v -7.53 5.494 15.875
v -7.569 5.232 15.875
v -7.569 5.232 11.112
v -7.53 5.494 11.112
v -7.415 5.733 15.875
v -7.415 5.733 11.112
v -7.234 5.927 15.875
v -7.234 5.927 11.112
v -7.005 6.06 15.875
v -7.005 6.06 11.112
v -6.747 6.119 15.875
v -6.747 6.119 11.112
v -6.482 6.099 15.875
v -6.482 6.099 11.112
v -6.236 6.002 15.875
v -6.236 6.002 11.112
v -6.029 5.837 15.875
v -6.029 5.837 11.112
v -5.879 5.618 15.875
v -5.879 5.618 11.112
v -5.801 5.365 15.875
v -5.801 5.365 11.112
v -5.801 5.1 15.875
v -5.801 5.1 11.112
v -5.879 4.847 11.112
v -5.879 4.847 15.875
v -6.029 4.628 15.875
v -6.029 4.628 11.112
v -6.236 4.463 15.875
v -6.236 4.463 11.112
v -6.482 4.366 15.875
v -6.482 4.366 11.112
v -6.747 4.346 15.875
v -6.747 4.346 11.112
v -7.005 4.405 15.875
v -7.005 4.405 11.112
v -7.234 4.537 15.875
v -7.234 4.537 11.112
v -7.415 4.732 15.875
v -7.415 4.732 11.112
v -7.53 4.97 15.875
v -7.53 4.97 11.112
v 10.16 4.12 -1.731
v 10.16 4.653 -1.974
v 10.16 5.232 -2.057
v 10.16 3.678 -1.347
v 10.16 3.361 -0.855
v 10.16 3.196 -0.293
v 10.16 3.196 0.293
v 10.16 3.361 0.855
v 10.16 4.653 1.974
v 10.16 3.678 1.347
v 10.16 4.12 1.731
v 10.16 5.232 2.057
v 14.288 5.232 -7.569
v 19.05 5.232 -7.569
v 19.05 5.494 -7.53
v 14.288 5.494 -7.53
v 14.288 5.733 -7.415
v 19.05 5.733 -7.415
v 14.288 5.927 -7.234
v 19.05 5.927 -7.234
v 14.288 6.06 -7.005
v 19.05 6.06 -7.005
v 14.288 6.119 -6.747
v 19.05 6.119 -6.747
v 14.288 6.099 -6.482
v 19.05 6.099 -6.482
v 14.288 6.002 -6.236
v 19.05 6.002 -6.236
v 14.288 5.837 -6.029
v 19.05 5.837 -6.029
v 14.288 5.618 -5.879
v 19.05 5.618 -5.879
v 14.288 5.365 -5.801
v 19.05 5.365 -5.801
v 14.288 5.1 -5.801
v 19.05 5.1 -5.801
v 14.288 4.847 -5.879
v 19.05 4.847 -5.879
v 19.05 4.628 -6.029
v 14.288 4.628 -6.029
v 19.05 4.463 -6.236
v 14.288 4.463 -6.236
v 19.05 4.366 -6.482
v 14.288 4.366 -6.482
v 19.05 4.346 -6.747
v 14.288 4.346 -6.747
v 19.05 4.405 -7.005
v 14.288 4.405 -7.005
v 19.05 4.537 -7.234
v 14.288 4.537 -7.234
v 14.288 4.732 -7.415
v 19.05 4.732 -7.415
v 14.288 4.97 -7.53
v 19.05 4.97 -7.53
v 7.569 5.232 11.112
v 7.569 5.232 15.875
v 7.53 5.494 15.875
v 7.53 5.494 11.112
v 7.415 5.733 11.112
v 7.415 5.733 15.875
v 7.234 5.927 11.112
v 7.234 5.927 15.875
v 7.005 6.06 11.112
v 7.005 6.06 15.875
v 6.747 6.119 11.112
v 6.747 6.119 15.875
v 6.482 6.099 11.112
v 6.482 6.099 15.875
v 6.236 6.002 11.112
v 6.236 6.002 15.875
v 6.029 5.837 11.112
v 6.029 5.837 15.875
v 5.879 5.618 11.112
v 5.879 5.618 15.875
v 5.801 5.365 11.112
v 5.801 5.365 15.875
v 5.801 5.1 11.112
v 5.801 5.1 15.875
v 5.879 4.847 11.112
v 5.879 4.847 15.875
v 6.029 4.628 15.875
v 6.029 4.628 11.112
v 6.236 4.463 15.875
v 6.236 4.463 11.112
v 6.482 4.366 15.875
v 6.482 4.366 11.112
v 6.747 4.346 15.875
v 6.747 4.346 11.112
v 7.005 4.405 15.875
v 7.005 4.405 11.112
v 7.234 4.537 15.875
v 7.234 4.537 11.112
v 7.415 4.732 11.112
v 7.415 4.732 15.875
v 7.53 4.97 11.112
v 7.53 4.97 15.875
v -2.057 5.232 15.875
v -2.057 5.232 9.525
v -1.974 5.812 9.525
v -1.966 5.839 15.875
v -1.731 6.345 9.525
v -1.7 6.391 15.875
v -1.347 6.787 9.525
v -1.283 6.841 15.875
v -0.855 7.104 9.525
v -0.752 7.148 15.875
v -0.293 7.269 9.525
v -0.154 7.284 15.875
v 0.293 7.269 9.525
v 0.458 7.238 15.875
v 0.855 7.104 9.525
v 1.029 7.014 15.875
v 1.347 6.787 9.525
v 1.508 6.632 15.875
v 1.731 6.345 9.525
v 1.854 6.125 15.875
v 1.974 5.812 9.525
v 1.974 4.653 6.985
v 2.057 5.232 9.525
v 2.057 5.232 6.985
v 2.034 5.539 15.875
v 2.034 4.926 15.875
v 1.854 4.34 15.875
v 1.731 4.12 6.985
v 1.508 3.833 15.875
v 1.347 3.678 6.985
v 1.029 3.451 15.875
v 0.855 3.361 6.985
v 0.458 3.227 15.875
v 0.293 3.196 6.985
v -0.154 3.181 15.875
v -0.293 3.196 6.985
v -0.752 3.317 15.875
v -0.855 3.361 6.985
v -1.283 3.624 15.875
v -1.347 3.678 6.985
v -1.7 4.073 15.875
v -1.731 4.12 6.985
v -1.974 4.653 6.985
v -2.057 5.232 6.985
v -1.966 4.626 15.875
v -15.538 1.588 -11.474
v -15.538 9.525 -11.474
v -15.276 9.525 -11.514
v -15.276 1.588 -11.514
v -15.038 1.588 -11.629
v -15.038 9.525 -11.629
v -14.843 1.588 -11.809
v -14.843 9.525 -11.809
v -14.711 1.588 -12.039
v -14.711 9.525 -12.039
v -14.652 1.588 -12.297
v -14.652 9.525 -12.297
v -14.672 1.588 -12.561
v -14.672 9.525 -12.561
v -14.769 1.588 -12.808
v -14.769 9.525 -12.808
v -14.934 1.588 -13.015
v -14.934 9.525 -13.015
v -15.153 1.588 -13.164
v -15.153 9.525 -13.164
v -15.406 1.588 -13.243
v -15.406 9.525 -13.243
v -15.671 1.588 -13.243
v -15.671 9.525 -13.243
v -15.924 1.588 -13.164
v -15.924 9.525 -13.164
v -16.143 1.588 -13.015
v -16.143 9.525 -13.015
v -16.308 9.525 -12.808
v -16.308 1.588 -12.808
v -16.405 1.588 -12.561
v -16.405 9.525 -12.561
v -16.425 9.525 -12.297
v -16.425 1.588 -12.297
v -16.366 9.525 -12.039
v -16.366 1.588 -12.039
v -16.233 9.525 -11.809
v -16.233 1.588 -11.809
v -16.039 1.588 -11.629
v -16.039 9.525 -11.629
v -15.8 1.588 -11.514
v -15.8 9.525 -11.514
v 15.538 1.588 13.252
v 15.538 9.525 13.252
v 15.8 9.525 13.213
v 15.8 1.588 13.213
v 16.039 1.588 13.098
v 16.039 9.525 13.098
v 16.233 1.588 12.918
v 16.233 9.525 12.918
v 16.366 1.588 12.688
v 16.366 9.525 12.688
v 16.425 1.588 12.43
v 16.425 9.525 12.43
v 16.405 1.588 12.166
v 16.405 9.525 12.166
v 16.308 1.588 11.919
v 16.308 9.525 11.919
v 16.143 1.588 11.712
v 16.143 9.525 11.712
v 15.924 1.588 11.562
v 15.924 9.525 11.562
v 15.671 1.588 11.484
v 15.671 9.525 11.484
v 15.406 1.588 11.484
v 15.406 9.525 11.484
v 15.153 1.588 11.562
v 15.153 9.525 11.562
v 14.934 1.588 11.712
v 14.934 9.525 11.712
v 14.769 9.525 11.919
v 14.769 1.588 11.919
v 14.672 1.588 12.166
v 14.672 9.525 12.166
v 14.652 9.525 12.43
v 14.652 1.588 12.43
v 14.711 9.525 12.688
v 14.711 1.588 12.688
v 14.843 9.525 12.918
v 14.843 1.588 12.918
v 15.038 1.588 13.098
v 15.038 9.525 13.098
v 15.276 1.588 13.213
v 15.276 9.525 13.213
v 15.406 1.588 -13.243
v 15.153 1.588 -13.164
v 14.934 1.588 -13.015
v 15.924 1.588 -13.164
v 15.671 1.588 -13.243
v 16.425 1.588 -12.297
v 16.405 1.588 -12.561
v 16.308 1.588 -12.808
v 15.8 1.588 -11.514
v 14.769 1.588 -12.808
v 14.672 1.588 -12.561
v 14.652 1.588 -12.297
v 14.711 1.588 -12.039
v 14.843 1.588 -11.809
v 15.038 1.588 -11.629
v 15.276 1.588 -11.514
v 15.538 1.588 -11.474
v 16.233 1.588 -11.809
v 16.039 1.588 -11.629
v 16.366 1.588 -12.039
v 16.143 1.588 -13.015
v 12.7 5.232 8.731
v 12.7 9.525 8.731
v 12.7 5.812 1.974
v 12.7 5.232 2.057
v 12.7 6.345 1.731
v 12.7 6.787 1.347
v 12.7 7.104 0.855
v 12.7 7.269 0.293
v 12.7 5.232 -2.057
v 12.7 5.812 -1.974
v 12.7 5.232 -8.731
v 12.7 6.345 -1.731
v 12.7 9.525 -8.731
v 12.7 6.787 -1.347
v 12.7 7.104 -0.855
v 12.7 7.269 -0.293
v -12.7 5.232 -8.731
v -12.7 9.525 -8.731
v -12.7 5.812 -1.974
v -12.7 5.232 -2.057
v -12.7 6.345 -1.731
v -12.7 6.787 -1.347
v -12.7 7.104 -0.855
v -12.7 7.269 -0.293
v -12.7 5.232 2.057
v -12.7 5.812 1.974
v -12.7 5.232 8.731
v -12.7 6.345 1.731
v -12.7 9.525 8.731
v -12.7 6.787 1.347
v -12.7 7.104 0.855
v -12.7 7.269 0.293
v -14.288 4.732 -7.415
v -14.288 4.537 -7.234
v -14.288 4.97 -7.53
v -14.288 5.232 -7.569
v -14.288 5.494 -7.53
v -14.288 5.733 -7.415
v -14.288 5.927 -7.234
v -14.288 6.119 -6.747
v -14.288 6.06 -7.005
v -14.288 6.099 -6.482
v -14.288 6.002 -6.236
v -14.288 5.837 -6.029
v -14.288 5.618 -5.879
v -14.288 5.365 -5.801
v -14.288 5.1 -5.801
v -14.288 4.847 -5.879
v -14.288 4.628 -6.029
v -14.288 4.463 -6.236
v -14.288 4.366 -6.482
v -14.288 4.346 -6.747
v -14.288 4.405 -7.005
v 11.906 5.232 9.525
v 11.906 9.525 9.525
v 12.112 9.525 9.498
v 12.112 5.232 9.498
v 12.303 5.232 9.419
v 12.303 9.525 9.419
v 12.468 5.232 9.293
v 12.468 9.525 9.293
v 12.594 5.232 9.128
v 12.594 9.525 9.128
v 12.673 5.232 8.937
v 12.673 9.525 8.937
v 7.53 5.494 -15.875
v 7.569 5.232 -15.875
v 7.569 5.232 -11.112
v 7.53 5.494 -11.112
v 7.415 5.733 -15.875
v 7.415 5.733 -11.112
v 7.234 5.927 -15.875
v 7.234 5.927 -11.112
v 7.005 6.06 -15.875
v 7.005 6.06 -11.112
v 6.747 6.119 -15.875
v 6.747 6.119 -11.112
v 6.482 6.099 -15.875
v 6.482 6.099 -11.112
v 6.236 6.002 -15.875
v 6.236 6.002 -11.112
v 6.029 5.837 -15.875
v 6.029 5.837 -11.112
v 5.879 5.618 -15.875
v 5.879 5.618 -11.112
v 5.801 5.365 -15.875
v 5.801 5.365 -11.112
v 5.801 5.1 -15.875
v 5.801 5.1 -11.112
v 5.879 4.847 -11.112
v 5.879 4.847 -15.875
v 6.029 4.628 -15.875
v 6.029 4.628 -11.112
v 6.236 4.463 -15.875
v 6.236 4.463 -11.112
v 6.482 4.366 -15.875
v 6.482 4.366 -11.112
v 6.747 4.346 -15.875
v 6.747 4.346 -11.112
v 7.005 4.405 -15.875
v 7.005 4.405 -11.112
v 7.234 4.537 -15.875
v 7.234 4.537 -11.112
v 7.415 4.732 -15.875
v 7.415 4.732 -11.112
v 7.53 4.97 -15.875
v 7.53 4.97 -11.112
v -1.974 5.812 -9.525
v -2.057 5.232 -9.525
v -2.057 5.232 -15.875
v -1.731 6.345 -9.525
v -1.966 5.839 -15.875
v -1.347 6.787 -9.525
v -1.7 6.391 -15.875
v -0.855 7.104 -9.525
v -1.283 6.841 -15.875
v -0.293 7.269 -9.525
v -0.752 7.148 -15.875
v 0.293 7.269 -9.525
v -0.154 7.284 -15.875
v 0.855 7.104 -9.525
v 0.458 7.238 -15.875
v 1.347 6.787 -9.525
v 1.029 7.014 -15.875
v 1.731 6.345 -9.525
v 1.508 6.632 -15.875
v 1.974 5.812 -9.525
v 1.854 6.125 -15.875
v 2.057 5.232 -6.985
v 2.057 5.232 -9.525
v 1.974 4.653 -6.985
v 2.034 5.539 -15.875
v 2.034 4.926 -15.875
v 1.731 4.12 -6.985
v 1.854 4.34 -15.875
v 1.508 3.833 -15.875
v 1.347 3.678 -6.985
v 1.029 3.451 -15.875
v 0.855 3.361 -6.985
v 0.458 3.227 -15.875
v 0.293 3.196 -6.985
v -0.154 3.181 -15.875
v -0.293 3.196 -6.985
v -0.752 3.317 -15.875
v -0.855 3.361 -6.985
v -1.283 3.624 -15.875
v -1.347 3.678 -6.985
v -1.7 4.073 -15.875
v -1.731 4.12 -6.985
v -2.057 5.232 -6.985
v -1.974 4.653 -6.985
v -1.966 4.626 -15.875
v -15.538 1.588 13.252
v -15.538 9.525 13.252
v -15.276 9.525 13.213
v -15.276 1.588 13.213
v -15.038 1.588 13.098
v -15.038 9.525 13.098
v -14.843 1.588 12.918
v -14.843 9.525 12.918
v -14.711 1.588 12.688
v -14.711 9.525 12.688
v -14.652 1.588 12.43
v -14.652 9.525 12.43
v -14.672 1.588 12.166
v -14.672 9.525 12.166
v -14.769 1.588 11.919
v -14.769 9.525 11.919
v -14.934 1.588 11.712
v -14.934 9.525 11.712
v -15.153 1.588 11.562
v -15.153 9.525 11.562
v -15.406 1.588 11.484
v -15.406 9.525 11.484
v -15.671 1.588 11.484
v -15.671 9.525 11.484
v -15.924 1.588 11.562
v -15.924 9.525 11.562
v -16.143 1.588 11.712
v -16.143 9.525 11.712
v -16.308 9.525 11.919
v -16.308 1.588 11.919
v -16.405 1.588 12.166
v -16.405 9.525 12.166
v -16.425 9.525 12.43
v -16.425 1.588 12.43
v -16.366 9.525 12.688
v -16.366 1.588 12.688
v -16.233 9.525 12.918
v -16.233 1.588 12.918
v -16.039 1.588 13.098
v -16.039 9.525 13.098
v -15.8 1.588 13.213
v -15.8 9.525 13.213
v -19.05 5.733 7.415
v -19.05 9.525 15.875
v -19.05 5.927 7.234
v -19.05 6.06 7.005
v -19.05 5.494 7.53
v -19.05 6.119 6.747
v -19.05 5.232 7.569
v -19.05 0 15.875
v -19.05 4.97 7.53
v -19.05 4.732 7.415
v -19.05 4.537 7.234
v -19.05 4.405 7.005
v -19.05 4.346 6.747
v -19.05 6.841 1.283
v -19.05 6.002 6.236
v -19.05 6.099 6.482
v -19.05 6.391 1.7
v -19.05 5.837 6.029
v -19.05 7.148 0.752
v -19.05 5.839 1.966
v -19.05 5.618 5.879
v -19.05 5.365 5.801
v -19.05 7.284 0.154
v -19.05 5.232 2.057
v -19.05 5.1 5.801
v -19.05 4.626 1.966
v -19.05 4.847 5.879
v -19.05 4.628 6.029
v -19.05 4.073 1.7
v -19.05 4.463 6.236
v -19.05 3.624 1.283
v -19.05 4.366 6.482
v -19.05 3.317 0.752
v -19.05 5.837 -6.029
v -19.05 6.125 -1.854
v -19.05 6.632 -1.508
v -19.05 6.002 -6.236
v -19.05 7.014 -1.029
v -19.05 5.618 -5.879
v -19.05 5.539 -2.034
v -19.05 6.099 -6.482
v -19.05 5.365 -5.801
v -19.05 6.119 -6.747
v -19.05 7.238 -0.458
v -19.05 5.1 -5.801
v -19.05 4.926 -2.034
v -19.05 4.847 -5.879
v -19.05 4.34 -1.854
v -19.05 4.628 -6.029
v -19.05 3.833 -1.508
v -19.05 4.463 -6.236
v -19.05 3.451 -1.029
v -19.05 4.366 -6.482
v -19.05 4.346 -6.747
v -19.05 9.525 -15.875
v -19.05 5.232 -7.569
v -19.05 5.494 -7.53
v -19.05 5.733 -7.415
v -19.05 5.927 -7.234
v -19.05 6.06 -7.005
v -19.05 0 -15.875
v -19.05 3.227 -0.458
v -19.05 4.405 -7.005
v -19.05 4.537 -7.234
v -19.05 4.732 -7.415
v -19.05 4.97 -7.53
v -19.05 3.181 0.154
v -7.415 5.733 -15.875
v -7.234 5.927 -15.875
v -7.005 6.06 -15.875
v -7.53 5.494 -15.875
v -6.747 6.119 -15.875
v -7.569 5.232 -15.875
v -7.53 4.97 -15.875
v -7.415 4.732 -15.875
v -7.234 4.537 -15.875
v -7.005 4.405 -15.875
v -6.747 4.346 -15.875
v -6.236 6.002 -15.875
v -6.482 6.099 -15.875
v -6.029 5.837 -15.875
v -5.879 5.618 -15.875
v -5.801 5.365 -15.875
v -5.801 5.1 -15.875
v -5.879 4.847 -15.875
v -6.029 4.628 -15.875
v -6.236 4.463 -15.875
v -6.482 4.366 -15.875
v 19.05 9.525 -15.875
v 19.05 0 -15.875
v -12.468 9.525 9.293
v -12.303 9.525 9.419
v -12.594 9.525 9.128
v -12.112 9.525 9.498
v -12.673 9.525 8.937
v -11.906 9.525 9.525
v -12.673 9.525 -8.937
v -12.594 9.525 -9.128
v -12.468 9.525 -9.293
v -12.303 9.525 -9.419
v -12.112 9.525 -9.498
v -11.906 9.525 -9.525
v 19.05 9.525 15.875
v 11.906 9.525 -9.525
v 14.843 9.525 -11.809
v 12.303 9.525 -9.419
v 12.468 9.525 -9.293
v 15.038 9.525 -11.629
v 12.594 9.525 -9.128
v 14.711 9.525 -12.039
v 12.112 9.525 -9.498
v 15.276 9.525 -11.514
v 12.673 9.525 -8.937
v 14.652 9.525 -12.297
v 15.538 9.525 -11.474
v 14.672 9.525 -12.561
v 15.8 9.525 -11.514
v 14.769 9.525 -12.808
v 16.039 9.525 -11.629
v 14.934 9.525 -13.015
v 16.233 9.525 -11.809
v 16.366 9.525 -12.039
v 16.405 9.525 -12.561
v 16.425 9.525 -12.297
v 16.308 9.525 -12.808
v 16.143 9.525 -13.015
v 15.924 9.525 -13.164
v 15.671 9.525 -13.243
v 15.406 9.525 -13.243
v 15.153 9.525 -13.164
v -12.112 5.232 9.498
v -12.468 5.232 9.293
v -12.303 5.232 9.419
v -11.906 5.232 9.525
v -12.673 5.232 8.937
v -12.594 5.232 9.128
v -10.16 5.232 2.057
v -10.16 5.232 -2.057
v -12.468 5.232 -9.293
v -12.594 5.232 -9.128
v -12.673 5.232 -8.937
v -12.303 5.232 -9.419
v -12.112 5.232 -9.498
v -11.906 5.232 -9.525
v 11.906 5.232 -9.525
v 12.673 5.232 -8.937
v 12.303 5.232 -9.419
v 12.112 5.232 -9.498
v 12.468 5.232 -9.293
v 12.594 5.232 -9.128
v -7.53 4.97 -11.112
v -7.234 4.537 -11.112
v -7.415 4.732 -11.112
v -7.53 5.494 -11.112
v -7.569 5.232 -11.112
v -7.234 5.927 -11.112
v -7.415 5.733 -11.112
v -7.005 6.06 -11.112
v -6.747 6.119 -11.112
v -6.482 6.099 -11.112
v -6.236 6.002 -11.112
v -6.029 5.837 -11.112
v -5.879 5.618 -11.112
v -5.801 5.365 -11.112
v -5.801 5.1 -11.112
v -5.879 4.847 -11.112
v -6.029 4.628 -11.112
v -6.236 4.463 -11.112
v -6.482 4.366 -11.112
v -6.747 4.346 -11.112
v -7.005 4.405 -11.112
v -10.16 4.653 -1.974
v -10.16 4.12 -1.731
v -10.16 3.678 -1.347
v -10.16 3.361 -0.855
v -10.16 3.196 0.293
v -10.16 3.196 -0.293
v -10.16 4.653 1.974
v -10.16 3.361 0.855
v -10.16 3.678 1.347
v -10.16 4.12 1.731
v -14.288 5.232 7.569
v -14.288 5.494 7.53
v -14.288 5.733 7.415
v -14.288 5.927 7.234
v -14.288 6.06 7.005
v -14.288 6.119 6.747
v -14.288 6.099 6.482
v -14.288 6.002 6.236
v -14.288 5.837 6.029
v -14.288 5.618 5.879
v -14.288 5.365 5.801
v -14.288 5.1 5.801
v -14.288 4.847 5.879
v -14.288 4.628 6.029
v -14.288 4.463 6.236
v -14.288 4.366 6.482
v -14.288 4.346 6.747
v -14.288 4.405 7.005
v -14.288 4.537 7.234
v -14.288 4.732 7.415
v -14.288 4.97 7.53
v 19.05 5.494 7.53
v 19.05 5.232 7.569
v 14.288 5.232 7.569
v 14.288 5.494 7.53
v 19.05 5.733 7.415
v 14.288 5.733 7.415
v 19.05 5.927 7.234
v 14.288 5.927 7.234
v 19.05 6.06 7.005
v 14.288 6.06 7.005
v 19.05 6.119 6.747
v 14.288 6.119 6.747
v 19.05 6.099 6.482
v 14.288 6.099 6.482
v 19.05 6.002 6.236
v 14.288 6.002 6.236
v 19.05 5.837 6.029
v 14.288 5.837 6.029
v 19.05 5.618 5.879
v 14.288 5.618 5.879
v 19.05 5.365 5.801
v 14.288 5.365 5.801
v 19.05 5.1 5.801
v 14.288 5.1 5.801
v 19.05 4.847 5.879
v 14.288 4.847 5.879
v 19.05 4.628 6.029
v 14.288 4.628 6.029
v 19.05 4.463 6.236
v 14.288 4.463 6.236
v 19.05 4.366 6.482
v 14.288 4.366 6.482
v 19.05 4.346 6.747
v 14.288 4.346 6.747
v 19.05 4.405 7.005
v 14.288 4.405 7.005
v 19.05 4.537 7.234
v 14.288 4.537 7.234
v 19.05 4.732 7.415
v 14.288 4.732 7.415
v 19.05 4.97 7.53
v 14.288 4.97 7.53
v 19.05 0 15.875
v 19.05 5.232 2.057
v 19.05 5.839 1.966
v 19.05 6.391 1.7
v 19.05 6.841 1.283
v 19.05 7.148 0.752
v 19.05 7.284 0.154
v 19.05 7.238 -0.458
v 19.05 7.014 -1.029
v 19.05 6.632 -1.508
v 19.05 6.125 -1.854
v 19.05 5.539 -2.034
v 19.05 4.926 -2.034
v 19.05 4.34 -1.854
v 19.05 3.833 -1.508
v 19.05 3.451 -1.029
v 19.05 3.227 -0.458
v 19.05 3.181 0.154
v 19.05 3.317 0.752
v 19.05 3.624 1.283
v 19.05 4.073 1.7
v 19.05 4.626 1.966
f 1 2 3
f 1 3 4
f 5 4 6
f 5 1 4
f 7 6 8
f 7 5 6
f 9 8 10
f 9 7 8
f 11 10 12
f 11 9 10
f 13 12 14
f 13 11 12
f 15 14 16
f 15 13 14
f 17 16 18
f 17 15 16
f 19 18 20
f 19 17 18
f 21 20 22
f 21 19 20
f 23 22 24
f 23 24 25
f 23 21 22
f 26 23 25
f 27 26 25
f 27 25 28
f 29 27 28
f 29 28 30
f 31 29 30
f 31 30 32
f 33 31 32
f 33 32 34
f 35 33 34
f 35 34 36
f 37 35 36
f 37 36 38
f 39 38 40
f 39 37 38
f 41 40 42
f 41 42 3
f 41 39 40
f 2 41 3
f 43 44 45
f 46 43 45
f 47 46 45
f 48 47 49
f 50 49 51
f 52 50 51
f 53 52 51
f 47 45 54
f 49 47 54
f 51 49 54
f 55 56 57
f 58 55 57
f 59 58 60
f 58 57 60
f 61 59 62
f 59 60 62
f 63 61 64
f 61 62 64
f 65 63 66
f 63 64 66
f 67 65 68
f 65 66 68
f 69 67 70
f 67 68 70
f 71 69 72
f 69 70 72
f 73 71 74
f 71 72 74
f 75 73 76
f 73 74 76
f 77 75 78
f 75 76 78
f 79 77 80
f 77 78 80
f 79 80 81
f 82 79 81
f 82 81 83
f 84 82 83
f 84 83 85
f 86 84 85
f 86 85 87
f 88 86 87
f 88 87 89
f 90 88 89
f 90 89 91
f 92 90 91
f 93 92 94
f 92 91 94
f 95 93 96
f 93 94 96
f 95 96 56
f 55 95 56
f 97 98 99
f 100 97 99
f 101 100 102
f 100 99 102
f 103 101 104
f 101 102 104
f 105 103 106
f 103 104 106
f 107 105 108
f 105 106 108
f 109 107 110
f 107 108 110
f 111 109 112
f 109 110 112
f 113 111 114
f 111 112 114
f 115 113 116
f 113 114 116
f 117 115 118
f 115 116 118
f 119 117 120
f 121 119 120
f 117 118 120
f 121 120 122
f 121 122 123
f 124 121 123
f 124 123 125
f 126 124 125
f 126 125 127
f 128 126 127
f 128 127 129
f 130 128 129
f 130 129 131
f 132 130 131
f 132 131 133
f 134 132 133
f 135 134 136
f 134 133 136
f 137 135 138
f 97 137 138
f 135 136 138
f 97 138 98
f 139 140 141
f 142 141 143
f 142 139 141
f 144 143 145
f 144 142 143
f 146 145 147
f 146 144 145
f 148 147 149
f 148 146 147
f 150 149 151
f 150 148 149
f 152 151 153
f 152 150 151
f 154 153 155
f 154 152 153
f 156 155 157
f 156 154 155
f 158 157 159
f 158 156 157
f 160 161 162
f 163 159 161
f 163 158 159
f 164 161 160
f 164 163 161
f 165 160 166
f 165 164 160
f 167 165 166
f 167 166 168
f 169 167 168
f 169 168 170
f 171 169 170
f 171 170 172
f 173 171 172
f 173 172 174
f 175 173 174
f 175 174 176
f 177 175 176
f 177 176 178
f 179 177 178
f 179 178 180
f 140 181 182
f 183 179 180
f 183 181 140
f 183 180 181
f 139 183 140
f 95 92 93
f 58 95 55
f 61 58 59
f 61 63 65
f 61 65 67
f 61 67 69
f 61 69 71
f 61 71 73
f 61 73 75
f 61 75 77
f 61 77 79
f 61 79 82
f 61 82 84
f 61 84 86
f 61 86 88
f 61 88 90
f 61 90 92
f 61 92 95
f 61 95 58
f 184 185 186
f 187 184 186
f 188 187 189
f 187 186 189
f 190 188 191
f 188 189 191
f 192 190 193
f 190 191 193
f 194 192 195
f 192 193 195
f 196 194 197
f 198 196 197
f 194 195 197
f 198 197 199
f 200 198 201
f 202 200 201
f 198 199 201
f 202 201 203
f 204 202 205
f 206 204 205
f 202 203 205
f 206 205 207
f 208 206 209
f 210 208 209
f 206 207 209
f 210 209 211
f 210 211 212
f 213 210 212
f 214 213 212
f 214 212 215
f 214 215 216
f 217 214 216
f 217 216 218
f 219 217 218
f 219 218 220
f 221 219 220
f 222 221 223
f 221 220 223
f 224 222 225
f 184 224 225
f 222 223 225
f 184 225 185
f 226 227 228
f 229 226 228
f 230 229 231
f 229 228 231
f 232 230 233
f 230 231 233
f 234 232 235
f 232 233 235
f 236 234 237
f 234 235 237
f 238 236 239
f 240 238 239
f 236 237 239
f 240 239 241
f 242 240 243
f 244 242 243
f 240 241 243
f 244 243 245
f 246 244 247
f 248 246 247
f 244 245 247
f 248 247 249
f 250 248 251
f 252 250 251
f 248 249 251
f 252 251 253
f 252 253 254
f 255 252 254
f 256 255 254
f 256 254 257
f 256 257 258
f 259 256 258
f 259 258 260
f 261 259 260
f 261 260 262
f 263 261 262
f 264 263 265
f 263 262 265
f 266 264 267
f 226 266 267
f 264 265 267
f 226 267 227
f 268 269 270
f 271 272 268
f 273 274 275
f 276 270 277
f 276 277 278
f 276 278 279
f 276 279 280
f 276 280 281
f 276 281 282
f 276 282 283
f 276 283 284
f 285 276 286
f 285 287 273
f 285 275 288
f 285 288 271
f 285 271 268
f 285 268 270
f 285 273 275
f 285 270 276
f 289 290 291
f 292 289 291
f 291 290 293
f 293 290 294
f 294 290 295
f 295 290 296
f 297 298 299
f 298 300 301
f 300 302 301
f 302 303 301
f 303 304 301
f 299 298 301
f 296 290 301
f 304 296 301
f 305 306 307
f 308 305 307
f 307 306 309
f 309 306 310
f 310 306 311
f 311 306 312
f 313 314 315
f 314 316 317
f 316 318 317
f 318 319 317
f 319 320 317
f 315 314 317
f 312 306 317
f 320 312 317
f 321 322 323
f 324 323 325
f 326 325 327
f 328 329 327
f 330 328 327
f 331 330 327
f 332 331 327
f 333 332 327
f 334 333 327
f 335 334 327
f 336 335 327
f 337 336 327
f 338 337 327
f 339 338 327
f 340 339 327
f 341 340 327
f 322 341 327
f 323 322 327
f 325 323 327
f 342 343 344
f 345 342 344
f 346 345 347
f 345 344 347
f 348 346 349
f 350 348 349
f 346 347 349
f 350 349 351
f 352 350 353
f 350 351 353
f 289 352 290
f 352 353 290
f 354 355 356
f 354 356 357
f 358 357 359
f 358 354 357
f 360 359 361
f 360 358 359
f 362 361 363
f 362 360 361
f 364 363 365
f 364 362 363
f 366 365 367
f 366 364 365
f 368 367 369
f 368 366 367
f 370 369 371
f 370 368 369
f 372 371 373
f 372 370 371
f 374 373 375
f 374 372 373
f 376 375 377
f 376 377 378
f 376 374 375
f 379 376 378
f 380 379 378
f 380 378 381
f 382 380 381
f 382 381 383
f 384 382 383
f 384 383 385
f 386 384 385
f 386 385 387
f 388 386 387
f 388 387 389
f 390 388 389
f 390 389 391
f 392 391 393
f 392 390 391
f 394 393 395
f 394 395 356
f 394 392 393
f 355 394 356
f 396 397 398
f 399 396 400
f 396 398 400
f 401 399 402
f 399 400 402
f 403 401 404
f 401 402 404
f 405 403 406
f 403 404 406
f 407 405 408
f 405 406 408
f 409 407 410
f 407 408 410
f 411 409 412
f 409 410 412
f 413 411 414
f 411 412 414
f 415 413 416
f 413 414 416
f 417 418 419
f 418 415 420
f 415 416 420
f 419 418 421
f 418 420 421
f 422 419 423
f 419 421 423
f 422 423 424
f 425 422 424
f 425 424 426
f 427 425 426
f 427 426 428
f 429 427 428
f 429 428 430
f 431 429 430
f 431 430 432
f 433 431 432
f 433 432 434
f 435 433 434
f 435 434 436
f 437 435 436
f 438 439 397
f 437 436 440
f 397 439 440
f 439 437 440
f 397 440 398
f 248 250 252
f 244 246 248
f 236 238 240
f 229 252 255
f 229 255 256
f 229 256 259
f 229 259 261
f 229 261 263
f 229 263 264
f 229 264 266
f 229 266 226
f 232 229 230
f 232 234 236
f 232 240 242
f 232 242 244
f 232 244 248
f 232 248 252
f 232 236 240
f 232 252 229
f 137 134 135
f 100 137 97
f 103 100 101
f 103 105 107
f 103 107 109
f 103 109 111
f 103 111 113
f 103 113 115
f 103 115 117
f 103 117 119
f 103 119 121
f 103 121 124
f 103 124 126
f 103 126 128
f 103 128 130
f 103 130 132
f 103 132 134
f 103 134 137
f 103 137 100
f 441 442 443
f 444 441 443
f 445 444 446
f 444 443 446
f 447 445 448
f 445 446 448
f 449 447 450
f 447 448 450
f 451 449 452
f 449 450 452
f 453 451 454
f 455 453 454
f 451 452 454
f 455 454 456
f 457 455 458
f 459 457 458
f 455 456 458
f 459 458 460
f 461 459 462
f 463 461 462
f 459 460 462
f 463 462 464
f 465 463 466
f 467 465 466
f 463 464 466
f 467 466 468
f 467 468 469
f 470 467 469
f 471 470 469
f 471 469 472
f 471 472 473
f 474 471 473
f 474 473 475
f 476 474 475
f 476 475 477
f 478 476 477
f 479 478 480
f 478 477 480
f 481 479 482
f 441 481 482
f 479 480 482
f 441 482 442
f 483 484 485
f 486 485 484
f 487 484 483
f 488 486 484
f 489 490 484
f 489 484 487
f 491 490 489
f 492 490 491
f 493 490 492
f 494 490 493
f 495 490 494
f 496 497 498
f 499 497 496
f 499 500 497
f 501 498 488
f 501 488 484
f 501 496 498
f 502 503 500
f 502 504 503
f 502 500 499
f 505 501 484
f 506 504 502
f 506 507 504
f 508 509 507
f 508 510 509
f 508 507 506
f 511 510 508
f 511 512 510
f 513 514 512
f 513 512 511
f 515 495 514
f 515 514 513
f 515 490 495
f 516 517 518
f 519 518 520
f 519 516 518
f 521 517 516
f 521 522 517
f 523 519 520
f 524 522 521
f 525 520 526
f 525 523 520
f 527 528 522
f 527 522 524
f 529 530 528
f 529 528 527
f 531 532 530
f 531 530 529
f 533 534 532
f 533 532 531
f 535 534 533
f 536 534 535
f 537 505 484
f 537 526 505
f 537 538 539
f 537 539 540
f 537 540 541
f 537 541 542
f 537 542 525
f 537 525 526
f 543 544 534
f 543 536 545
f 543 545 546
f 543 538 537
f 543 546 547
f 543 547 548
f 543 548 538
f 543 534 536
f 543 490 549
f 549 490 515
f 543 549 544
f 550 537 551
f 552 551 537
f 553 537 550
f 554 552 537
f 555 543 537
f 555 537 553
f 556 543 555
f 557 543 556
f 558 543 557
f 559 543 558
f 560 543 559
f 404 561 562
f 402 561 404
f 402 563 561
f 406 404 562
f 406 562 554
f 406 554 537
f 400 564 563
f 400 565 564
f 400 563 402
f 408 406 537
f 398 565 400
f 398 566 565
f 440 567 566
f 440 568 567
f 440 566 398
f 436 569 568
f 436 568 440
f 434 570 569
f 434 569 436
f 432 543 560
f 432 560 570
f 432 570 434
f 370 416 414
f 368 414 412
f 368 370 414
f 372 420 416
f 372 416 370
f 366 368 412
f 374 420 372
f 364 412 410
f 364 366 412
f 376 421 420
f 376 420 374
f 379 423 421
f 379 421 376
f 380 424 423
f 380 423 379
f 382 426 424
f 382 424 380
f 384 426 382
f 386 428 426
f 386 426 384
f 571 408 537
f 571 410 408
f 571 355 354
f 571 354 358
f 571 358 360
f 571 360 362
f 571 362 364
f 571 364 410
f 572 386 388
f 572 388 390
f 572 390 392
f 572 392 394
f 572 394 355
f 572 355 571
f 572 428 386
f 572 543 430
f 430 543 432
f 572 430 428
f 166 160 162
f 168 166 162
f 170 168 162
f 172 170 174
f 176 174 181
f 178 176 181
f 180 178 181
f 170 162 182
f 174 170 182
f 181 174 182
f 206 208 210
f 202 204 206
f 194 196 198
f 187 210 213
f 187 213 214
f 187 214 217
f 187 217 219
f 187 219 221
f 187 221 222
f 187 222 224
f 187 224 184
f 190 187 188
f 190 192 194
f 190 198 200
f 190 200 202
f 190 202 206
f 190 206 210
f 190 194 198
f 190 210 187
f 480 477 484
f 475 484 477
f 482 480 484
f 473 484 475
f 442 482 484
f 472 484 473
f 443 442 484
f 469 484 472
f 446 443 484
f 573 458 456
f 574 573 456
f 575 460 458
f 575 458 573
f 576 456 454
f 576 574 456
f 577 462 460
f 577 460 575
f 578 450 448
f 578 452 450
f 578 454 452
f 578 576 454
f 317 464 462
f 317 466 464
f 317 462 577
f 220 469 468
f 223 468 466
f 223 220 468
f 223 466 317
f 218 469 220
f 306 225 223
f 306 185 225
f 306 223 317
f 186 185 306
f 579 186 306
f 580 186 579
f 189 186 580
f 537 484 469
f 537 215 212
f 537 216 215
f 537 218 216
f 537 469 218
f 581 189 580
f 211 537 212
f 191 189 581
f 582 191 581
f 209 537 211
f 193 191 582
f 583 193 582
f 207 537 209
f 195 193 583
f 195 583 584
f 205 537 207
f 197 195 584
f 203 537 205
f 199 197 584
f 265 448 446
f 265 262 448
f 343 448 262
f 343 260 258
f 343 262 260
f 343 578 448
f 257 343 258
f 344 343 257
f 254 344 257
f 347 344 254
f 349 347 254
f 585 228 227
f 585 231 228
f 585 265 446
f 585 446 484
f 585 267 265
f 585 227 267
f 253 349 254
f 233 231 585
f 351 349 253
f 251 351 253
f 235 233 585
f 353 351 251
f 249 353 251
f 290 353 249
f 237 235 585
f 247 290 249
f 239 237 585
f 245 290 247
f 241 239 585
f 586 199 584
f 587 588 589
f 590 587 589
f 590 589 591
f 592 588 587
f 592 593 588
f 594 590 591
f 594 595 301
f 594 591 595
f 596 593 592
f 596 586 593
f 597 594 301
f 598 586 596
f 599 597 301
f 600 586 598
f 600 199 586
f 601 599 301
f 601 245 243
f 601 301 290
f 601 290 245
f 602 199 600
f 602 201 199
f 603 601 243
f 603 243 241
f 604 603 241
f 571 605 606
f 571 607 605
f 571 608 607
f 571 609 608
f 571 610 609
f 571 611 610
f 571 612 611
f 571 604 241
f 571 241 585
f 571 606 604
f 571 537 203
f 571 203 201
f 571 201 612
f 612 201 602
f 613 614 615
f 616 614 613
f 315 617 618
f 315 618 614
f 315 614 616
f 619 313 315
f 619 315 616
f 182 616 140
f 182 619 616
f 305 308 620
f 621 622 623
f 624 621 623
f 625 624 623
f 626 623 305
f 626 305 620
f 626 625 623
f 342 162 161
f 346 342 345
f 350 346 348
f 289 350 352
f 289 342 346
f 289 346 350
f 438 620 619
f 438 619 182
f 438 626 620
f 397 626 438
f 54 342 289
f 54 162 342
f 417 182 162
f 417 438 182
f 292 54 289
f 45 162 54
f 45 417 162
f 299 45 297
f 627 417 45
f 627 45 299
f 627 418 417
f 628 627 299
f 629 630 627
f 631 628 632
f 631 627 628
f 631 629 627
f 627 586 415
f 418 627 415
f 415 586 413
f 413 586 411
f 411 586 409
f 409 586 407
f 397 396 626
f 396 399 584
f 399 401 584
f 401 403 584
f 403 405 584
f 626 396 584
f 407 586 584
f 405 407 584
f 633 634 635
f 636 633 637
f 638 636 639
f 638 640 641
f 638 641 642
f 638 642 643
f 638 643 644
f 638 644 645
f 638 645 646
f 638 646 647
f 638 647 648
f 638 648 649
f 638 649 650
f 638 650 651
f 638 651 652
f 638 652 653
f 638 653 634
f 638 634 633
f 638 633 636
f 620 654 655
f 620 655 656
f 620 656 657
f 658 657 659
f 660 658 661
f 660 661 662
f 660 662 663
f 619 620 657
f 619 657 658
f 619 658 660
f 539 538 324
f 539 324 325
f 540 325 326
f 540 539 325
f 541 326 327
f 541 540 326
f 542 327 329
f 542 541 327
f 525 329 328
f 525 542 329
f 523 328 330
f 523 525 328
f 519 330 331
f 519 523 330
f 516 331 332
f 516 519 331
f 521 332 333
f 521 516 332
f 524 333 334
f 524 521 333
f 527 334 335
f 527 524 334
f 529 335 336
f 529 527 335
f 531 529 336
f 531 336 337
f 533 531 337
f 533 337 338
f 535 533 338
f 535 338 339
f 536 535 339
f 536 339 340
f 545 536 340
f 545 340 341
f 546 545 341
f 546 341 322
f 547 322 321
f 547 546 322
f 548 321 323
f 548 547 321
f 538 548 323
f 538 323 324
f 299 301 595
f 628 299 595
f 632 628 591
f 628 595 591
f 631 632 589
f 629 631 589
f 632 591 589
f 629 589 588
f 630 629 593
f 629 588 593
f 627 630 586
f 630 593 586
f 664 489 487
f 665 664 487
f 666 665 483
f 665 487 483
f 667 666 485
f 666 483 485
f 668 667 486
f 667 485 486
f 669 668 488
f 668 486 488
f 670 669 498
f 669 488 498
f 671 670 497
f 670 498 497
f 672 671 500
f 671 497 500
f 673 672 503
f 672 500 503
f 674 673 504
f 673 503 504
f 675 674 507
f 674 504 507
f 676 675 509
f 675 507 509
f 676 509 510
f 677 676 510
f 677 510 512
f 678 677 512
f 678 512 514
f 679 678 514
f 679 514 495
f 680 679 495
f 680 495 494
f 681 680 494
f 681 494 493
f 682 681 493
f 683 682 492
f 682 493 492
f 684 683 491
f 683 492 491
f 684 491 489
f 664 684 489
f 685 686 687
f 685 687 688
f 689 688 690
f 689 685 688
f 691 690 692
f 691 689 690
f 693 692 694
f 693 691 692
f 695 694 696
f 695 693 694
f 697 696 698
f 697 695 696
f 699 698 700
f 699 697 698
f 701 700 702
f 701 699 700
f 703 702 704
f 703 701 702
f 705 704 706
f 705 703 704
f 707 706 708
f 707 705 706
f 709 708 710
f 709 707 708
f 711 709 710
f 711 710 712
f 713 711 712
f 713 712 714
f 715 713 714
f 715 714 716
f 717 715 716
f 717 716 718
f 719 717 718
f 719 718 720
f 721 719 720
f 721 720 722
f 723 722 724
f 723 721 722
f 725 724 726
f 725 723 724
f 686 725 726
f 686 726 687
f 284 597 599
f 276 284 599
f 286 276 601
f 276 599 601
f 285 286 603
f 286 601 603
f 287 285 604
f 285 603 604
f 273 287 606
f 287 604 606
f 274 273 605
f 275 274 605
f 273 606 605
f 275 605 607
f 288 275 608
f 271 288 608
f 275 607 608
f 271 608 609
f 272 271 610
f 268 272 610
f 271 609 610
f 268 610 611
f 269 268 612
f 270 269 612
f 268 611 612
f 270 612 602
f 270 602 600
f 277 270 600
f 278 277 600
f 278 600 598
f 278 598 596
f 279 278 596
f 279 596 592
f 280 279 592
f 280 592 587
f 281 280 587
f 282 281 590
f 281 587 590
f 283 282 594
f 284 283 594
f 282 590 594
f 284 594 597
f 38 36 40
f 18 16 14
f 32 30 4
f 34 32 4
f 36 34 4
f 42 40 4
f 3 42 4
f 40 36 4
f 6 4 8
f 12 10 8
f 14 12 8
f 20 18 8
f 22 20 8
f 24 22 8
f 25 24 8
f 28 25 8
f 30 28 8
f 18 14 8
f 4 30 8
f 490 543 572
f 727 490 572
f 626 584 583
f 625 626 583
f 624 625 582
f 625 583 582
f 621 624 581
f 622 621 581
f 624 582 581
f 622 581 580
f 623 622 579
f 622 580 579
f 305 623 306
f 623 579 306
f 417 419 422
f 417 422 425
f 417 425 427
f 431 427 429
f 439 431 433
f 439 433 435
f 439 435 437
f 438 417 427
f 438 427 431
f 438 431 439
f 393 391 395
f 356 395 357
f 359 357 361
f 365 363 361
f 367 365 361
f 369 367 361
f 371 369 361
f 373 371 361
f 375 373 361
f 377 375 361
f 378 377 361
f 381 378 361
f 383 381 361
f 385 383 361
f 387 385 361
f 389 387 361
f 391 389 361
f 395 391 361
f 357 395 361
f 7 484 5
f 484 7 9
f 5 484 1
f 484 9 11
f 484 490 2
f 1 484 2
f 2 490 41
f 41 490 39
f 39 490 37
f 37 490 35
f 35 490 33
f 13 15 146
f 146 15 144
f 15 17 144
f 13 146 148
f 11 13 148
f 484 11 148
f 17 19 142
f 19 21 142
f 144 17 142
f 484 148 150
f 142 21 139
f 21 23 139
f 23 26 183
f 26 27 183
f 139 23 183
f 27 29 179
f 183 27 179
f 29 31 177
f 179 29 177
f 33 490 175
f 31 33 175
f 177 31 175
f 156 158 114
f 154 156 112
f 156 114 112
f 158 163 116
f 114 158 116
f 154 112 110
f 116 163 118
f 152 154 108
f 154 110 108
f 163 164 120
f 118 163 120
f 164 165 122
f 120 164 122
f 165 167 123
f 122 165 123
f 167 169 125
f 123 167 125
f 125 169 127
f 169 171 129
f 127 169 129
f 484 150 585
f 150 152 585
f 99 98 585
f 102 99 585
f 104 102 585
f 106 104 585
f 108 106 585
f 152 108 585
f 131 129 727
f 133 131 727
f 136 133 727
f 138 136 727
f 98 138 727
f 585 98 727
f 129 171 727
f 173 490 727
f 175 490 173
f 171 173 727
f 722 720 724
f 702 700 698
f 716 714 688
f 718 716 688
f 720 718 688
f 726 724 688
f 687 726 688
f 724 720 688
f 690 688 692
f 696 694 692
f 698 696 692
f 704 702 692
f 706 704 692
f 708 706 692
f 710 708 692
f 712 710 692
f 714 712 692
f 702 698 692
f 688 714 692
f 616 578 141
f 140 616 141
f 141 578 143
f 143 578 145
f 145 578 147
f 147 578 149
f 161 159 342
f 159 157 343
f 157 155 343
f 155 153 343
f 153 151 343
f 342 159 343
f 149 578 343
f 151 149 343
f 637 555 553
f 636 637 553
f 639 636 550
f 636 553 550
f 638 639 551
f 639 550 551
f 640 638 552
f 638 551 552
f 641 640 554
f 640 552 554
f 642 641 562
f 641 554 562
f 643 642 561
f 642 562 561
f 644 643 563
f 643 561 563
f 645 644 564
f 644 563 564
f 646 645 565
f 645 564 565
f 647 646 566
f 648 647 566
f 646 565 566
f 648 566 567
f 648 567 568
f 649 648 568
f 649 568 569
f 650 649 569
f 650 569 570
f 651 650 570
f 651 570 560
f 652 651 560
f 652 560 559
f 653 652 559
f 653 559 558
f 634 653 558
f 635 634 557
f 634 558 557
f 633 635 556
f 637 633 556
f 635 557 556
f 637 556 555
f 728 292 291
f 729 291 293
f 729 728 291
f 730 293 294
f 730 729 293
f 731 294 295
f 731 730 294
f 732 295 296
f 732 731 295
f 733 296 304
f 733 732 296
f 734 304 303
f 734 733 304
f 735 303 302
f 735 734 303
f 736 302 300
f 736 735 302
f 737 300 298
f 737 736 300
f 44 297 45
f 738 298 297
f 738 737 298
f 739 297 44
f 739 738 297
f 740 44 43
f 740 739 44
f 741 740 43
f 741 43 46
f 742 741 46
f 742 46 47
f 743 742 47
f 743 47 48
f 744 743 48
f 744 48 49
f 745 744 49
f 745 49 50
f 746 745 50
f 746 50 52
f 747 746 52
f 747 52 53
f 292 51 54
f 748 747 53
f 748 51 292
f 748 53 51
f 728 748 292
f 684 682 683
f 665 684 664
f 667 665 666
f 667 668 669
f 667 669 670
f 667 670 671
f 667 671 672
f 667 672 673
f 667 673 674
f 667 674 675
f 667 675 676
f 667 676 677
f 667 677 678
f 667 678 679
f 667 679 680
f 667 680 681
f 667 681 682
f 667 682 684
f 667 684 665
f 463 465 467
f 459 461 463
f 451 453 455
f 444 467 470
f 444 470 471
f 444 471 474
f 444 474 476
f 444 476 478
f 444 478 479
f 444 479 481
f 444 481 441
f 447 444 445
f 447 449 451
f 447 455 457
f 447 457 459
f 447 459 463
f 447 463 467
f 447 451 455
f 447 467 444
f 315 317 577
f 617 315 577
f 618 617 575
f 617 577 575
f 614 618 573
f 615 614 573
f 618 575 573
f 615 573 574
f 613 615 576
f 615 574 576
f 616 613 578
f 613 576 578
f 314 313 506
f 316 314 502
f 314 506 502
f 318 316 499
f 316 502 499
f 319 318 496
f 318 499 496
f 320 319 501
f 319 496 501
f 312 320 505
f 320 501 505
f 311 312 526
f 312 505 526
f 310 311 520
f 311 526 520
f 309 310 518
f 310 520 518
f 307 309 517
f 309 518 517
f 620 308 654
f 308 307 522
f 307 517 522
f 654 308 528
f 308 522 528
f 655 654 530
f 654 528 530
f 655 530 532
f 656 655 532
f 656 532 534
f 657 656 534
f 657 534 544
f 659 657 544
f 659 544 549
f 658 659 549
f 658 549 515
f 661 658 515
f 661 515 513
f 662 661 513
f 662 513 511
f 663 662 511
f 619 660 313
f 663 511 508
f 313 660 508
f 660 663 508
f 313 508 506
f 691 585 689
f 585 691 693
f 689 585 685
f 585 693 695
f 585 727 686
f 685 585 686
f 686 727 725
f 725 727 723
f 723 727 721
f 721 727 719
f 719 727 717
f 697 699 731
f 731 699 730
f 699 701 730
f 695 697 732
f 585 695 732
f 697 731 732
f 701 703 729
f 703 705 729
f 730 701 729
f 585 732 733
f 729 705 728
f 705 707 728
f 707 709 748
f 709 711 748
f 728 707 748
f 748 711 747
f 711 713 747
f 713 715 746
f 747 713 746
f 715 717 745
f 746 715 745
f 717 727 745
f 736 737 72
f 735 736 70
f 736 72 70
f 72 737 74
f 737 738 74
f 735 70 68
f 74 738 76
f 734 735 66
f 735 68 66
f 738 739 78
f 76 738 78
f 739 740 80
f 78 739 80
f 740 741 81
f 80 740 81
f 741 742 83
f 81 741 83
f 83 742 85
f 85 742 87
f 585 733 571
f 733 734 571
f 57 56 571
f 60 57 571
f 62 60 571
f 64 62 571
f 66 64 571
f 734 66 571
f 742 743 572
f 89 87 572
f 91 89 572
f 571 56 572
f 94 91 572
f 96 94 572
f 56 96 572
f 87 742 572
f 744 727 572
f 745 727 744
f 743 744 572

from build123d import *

# Parameters (mm, degrees)
SKETCH1_W               = 38.1
SKETCH1_H               = 31.75
BOSS_EXTRUDE1_DEPTH     = 9.525
CUT_EXTRUDE2_DEPTH      = 4.2926
SKETCH3_R               = 2.0574
CUT_EXTRUDE3_DEPTH      = 8.89
SKETCH7_R               = 2.0574
CUT_EXTRUDE5_DEPTH      = 8.89
SKETCH8_R               = 0.889
CUT_EXTRUDE6_DEPTH      = 4.7625
MIRROR4_COPY_1_SKETCH_R = 0.889
MIRROR4_COPY_1_DEPTH    = 4.7625
SKETCH11_R              = 0.889
CUT_EXTRUDE7_DEPTH      = 4.7625
MIRROR6_COPY_1_SKETCH_R = 0.889
MIRROR6_COPY_1_DEPTH    = 4.7625
SKETCH12_R              = 0.889
CUT_EXTRUDE9_DEPTH      = 7.9375


with BuildPart() as part:
    # Sketch1 → Boss-Extrude1 (new body)
    with BuildSketch(Plane(origin=(0, 0, 0), x_dir=(1, 0, 0), z_dir=(0, 1, 0))):
        Rectangle(SKETCH1_W, SKETCH1_H)
    extrude(amount=BOSS_EXTRUDE1_DEPTH)

    # Sketch2 → Cut-Extrude2 (cut)
    with BuildSketch(Plane(origin=(0, 9.525, 0), x_dir=(1, 0, 0), z_dir=(0, 1, 0))):
        with BuildLine():
            Line((-11.90625, -9.525), (11.90625, -9.525))
            ThreePointArc((11.90625, -9.525), (12.467516008, -9.292516008), (12.7, -8.73125))
            Line((12.7, -8.73125), (12.7, 8.73125))
            ThreePointArc((12.7, 8.73125), (12.467516008, 9.292516008), (11.90625, 9.525))
            Line((11.90625, 9.525), (-11.90625, 9.525))
            ThreePointArc((-11.90625, 9.525), (-12.467516008, 9.292516008), (-12.7, 8.73125))
            Line((-12.7, 8.73125), (-12.7, -8.73125))
            ThreePointArc((-12.7, -8.73125), (-12.467516008, -9.292516008), (-11.90625, -9.525))
        make_face()
    extrude(amount=-CUT_EXTRUDE2_DEPTH, mode=Mode.SUBTRACT)

    # Sketch3 → Cut-Extrude3 (cut)
    with BuildSketch(Plane.ZY.offset(19.05)):
        with Locations((0, 5.2324)):
            Circle(SKETCH3_R)
    cut_extrude3 = extrude(amount=-CUT_EXTRUDE3_DEPTH, mode=Mode.SUBTRACT)

    # Mirror1: Cut-Extrude3 across plane
    add(cut_extrude3.mirror(Plane(origin=(0, 0, 0), x_dir=(0, 0, 1), z_dir=(1, 0, 0))), mode=Mode.SUBTRACT)

    # Sketch7 → Cut-Extrude5 (cut)
    with BuildSketch(Plane(origin=(0, 0, -15.875), x_dir=(-1, 0, 0), z_dir=(0, 0, -1))):
        with Locations((0, 5.2324)):
            Circle(SKETCH7_R)
    cut_extrude5 = extrude(amount=-CUT_EXTRUDE5_DEPTH, mode=Mode.SUBTRACT)

    # Mirror2: Cut-Extrude5 across plane
    add(cut_extrude5.mirror(Plane.XY), mode=Mode.SUBTRACT)

    # Sketch8 → Cut-Extrude6 (cut)
    with BuildSketch(Plane(origin=(19.05, 0, 0), x_dir=(0, 0, -1), z_dir=(1, 0, 0))):
        with Locations((6.6802, 5.2324)):
            Circle(SKETCH8_R)
    cut_extrude6 = extrude(amount=-CUT_EXTRUDE6_DEPTH, mode=Mode.SUBTRACT)

    # Mirror3: Cut-Extrude6 across plane
    add(cut_extrude6.mirror(Plane.XY), mode=Mode.SUBTRACT)

    # Mirror4: Cut-Extrude6 across plane
    add(cut_extrude6.mirror(Plane(origin=(0, 0, 0), x_dir=(0, 0, 1), z_dir=(1, 0, 0))), mode=Mode.SUBTRACT)

    # Mirror4 copy 1 sketch → Mirror4 copy 1 (cut)
    with BuildSketch(Plane.ZY.offset(19.05)):
        with Locations((6.6802, 5.2324)):
            Circle(MIRROR4_COPY_1_SKETCH_R)
    extrude(amount=-MIRROR4_COPY_1_DEPTH, mode=Mode.SUBTRACT)

    # Sketch11 → Cut-Extrude7 (cut)
    with BuildSketch(Plane.XY.offset(15.875)):
        with Locations((6.6802, 5.2324)):
            Circle(SKETCH11_R)
    cut_extrude7 = extrude(amount=-CUT_EXTRUDE7_DEPTH, mode=Mode.SUBTRACT)

    # Mirror5: Cut-Extrude7 across plane
    add(cut_extrude7.mirror(Plane(origin=(0, 0, 0), x_dir=(0, 0, 1), z_dir=(1, 0, 0))), mode=Mode.SUBTRACT)

    # Mirror6: Cut-Extrude7 across plane
    add(cut_extrude7.mirror(Plane.XY), mode=Mode.SUBTRACT)

    # Mirror6 copy 1 sketch → Mirror6 copy 1 (cut)
    with BuildSketch(Plane(origin=(0, 0, -15.875), x_dir=(-1, 0, 0), z_dir=(0, 0, -1))):
        with Locations((6.6802, 5.2324)):
            Circle(MIRROR6_COPY_1_SKETCH_R)
    extrude(amount=-MIRROR6_COPY_1_DEPTH, mode=Mode.SUBTRACT)

    # Sketch12 → Cut-Extrude9 (cut)
    with BuildSketch(Plane(origin=(0, 9.525, 0), x_dir=(1, 0, 0), z_dir=(0, 1, 0))):
        with Locations(Location((-15.53845, 12.36345, 0), (0, 0, 270))):
            Circle(SKETCH12_R)
        with Locations(Location((15.53845, 12.36345, 0), (0, 0, 270))):
            Circle(SKETCH12_R)
        with Locations(Location((-15.53845, -12.36345, 0), (0, 0, 270))):
            Circle(SKETCH12_R)
        with Locations(Location((15.53845, -12.36345, 0), (0, 0, 270))):
            Circle(SKETCH12_R)
    extrude(amount=-CUT_EXTRUDE9_DEPTH, mode=Mode.SUBTRACT)


solid = part.part
